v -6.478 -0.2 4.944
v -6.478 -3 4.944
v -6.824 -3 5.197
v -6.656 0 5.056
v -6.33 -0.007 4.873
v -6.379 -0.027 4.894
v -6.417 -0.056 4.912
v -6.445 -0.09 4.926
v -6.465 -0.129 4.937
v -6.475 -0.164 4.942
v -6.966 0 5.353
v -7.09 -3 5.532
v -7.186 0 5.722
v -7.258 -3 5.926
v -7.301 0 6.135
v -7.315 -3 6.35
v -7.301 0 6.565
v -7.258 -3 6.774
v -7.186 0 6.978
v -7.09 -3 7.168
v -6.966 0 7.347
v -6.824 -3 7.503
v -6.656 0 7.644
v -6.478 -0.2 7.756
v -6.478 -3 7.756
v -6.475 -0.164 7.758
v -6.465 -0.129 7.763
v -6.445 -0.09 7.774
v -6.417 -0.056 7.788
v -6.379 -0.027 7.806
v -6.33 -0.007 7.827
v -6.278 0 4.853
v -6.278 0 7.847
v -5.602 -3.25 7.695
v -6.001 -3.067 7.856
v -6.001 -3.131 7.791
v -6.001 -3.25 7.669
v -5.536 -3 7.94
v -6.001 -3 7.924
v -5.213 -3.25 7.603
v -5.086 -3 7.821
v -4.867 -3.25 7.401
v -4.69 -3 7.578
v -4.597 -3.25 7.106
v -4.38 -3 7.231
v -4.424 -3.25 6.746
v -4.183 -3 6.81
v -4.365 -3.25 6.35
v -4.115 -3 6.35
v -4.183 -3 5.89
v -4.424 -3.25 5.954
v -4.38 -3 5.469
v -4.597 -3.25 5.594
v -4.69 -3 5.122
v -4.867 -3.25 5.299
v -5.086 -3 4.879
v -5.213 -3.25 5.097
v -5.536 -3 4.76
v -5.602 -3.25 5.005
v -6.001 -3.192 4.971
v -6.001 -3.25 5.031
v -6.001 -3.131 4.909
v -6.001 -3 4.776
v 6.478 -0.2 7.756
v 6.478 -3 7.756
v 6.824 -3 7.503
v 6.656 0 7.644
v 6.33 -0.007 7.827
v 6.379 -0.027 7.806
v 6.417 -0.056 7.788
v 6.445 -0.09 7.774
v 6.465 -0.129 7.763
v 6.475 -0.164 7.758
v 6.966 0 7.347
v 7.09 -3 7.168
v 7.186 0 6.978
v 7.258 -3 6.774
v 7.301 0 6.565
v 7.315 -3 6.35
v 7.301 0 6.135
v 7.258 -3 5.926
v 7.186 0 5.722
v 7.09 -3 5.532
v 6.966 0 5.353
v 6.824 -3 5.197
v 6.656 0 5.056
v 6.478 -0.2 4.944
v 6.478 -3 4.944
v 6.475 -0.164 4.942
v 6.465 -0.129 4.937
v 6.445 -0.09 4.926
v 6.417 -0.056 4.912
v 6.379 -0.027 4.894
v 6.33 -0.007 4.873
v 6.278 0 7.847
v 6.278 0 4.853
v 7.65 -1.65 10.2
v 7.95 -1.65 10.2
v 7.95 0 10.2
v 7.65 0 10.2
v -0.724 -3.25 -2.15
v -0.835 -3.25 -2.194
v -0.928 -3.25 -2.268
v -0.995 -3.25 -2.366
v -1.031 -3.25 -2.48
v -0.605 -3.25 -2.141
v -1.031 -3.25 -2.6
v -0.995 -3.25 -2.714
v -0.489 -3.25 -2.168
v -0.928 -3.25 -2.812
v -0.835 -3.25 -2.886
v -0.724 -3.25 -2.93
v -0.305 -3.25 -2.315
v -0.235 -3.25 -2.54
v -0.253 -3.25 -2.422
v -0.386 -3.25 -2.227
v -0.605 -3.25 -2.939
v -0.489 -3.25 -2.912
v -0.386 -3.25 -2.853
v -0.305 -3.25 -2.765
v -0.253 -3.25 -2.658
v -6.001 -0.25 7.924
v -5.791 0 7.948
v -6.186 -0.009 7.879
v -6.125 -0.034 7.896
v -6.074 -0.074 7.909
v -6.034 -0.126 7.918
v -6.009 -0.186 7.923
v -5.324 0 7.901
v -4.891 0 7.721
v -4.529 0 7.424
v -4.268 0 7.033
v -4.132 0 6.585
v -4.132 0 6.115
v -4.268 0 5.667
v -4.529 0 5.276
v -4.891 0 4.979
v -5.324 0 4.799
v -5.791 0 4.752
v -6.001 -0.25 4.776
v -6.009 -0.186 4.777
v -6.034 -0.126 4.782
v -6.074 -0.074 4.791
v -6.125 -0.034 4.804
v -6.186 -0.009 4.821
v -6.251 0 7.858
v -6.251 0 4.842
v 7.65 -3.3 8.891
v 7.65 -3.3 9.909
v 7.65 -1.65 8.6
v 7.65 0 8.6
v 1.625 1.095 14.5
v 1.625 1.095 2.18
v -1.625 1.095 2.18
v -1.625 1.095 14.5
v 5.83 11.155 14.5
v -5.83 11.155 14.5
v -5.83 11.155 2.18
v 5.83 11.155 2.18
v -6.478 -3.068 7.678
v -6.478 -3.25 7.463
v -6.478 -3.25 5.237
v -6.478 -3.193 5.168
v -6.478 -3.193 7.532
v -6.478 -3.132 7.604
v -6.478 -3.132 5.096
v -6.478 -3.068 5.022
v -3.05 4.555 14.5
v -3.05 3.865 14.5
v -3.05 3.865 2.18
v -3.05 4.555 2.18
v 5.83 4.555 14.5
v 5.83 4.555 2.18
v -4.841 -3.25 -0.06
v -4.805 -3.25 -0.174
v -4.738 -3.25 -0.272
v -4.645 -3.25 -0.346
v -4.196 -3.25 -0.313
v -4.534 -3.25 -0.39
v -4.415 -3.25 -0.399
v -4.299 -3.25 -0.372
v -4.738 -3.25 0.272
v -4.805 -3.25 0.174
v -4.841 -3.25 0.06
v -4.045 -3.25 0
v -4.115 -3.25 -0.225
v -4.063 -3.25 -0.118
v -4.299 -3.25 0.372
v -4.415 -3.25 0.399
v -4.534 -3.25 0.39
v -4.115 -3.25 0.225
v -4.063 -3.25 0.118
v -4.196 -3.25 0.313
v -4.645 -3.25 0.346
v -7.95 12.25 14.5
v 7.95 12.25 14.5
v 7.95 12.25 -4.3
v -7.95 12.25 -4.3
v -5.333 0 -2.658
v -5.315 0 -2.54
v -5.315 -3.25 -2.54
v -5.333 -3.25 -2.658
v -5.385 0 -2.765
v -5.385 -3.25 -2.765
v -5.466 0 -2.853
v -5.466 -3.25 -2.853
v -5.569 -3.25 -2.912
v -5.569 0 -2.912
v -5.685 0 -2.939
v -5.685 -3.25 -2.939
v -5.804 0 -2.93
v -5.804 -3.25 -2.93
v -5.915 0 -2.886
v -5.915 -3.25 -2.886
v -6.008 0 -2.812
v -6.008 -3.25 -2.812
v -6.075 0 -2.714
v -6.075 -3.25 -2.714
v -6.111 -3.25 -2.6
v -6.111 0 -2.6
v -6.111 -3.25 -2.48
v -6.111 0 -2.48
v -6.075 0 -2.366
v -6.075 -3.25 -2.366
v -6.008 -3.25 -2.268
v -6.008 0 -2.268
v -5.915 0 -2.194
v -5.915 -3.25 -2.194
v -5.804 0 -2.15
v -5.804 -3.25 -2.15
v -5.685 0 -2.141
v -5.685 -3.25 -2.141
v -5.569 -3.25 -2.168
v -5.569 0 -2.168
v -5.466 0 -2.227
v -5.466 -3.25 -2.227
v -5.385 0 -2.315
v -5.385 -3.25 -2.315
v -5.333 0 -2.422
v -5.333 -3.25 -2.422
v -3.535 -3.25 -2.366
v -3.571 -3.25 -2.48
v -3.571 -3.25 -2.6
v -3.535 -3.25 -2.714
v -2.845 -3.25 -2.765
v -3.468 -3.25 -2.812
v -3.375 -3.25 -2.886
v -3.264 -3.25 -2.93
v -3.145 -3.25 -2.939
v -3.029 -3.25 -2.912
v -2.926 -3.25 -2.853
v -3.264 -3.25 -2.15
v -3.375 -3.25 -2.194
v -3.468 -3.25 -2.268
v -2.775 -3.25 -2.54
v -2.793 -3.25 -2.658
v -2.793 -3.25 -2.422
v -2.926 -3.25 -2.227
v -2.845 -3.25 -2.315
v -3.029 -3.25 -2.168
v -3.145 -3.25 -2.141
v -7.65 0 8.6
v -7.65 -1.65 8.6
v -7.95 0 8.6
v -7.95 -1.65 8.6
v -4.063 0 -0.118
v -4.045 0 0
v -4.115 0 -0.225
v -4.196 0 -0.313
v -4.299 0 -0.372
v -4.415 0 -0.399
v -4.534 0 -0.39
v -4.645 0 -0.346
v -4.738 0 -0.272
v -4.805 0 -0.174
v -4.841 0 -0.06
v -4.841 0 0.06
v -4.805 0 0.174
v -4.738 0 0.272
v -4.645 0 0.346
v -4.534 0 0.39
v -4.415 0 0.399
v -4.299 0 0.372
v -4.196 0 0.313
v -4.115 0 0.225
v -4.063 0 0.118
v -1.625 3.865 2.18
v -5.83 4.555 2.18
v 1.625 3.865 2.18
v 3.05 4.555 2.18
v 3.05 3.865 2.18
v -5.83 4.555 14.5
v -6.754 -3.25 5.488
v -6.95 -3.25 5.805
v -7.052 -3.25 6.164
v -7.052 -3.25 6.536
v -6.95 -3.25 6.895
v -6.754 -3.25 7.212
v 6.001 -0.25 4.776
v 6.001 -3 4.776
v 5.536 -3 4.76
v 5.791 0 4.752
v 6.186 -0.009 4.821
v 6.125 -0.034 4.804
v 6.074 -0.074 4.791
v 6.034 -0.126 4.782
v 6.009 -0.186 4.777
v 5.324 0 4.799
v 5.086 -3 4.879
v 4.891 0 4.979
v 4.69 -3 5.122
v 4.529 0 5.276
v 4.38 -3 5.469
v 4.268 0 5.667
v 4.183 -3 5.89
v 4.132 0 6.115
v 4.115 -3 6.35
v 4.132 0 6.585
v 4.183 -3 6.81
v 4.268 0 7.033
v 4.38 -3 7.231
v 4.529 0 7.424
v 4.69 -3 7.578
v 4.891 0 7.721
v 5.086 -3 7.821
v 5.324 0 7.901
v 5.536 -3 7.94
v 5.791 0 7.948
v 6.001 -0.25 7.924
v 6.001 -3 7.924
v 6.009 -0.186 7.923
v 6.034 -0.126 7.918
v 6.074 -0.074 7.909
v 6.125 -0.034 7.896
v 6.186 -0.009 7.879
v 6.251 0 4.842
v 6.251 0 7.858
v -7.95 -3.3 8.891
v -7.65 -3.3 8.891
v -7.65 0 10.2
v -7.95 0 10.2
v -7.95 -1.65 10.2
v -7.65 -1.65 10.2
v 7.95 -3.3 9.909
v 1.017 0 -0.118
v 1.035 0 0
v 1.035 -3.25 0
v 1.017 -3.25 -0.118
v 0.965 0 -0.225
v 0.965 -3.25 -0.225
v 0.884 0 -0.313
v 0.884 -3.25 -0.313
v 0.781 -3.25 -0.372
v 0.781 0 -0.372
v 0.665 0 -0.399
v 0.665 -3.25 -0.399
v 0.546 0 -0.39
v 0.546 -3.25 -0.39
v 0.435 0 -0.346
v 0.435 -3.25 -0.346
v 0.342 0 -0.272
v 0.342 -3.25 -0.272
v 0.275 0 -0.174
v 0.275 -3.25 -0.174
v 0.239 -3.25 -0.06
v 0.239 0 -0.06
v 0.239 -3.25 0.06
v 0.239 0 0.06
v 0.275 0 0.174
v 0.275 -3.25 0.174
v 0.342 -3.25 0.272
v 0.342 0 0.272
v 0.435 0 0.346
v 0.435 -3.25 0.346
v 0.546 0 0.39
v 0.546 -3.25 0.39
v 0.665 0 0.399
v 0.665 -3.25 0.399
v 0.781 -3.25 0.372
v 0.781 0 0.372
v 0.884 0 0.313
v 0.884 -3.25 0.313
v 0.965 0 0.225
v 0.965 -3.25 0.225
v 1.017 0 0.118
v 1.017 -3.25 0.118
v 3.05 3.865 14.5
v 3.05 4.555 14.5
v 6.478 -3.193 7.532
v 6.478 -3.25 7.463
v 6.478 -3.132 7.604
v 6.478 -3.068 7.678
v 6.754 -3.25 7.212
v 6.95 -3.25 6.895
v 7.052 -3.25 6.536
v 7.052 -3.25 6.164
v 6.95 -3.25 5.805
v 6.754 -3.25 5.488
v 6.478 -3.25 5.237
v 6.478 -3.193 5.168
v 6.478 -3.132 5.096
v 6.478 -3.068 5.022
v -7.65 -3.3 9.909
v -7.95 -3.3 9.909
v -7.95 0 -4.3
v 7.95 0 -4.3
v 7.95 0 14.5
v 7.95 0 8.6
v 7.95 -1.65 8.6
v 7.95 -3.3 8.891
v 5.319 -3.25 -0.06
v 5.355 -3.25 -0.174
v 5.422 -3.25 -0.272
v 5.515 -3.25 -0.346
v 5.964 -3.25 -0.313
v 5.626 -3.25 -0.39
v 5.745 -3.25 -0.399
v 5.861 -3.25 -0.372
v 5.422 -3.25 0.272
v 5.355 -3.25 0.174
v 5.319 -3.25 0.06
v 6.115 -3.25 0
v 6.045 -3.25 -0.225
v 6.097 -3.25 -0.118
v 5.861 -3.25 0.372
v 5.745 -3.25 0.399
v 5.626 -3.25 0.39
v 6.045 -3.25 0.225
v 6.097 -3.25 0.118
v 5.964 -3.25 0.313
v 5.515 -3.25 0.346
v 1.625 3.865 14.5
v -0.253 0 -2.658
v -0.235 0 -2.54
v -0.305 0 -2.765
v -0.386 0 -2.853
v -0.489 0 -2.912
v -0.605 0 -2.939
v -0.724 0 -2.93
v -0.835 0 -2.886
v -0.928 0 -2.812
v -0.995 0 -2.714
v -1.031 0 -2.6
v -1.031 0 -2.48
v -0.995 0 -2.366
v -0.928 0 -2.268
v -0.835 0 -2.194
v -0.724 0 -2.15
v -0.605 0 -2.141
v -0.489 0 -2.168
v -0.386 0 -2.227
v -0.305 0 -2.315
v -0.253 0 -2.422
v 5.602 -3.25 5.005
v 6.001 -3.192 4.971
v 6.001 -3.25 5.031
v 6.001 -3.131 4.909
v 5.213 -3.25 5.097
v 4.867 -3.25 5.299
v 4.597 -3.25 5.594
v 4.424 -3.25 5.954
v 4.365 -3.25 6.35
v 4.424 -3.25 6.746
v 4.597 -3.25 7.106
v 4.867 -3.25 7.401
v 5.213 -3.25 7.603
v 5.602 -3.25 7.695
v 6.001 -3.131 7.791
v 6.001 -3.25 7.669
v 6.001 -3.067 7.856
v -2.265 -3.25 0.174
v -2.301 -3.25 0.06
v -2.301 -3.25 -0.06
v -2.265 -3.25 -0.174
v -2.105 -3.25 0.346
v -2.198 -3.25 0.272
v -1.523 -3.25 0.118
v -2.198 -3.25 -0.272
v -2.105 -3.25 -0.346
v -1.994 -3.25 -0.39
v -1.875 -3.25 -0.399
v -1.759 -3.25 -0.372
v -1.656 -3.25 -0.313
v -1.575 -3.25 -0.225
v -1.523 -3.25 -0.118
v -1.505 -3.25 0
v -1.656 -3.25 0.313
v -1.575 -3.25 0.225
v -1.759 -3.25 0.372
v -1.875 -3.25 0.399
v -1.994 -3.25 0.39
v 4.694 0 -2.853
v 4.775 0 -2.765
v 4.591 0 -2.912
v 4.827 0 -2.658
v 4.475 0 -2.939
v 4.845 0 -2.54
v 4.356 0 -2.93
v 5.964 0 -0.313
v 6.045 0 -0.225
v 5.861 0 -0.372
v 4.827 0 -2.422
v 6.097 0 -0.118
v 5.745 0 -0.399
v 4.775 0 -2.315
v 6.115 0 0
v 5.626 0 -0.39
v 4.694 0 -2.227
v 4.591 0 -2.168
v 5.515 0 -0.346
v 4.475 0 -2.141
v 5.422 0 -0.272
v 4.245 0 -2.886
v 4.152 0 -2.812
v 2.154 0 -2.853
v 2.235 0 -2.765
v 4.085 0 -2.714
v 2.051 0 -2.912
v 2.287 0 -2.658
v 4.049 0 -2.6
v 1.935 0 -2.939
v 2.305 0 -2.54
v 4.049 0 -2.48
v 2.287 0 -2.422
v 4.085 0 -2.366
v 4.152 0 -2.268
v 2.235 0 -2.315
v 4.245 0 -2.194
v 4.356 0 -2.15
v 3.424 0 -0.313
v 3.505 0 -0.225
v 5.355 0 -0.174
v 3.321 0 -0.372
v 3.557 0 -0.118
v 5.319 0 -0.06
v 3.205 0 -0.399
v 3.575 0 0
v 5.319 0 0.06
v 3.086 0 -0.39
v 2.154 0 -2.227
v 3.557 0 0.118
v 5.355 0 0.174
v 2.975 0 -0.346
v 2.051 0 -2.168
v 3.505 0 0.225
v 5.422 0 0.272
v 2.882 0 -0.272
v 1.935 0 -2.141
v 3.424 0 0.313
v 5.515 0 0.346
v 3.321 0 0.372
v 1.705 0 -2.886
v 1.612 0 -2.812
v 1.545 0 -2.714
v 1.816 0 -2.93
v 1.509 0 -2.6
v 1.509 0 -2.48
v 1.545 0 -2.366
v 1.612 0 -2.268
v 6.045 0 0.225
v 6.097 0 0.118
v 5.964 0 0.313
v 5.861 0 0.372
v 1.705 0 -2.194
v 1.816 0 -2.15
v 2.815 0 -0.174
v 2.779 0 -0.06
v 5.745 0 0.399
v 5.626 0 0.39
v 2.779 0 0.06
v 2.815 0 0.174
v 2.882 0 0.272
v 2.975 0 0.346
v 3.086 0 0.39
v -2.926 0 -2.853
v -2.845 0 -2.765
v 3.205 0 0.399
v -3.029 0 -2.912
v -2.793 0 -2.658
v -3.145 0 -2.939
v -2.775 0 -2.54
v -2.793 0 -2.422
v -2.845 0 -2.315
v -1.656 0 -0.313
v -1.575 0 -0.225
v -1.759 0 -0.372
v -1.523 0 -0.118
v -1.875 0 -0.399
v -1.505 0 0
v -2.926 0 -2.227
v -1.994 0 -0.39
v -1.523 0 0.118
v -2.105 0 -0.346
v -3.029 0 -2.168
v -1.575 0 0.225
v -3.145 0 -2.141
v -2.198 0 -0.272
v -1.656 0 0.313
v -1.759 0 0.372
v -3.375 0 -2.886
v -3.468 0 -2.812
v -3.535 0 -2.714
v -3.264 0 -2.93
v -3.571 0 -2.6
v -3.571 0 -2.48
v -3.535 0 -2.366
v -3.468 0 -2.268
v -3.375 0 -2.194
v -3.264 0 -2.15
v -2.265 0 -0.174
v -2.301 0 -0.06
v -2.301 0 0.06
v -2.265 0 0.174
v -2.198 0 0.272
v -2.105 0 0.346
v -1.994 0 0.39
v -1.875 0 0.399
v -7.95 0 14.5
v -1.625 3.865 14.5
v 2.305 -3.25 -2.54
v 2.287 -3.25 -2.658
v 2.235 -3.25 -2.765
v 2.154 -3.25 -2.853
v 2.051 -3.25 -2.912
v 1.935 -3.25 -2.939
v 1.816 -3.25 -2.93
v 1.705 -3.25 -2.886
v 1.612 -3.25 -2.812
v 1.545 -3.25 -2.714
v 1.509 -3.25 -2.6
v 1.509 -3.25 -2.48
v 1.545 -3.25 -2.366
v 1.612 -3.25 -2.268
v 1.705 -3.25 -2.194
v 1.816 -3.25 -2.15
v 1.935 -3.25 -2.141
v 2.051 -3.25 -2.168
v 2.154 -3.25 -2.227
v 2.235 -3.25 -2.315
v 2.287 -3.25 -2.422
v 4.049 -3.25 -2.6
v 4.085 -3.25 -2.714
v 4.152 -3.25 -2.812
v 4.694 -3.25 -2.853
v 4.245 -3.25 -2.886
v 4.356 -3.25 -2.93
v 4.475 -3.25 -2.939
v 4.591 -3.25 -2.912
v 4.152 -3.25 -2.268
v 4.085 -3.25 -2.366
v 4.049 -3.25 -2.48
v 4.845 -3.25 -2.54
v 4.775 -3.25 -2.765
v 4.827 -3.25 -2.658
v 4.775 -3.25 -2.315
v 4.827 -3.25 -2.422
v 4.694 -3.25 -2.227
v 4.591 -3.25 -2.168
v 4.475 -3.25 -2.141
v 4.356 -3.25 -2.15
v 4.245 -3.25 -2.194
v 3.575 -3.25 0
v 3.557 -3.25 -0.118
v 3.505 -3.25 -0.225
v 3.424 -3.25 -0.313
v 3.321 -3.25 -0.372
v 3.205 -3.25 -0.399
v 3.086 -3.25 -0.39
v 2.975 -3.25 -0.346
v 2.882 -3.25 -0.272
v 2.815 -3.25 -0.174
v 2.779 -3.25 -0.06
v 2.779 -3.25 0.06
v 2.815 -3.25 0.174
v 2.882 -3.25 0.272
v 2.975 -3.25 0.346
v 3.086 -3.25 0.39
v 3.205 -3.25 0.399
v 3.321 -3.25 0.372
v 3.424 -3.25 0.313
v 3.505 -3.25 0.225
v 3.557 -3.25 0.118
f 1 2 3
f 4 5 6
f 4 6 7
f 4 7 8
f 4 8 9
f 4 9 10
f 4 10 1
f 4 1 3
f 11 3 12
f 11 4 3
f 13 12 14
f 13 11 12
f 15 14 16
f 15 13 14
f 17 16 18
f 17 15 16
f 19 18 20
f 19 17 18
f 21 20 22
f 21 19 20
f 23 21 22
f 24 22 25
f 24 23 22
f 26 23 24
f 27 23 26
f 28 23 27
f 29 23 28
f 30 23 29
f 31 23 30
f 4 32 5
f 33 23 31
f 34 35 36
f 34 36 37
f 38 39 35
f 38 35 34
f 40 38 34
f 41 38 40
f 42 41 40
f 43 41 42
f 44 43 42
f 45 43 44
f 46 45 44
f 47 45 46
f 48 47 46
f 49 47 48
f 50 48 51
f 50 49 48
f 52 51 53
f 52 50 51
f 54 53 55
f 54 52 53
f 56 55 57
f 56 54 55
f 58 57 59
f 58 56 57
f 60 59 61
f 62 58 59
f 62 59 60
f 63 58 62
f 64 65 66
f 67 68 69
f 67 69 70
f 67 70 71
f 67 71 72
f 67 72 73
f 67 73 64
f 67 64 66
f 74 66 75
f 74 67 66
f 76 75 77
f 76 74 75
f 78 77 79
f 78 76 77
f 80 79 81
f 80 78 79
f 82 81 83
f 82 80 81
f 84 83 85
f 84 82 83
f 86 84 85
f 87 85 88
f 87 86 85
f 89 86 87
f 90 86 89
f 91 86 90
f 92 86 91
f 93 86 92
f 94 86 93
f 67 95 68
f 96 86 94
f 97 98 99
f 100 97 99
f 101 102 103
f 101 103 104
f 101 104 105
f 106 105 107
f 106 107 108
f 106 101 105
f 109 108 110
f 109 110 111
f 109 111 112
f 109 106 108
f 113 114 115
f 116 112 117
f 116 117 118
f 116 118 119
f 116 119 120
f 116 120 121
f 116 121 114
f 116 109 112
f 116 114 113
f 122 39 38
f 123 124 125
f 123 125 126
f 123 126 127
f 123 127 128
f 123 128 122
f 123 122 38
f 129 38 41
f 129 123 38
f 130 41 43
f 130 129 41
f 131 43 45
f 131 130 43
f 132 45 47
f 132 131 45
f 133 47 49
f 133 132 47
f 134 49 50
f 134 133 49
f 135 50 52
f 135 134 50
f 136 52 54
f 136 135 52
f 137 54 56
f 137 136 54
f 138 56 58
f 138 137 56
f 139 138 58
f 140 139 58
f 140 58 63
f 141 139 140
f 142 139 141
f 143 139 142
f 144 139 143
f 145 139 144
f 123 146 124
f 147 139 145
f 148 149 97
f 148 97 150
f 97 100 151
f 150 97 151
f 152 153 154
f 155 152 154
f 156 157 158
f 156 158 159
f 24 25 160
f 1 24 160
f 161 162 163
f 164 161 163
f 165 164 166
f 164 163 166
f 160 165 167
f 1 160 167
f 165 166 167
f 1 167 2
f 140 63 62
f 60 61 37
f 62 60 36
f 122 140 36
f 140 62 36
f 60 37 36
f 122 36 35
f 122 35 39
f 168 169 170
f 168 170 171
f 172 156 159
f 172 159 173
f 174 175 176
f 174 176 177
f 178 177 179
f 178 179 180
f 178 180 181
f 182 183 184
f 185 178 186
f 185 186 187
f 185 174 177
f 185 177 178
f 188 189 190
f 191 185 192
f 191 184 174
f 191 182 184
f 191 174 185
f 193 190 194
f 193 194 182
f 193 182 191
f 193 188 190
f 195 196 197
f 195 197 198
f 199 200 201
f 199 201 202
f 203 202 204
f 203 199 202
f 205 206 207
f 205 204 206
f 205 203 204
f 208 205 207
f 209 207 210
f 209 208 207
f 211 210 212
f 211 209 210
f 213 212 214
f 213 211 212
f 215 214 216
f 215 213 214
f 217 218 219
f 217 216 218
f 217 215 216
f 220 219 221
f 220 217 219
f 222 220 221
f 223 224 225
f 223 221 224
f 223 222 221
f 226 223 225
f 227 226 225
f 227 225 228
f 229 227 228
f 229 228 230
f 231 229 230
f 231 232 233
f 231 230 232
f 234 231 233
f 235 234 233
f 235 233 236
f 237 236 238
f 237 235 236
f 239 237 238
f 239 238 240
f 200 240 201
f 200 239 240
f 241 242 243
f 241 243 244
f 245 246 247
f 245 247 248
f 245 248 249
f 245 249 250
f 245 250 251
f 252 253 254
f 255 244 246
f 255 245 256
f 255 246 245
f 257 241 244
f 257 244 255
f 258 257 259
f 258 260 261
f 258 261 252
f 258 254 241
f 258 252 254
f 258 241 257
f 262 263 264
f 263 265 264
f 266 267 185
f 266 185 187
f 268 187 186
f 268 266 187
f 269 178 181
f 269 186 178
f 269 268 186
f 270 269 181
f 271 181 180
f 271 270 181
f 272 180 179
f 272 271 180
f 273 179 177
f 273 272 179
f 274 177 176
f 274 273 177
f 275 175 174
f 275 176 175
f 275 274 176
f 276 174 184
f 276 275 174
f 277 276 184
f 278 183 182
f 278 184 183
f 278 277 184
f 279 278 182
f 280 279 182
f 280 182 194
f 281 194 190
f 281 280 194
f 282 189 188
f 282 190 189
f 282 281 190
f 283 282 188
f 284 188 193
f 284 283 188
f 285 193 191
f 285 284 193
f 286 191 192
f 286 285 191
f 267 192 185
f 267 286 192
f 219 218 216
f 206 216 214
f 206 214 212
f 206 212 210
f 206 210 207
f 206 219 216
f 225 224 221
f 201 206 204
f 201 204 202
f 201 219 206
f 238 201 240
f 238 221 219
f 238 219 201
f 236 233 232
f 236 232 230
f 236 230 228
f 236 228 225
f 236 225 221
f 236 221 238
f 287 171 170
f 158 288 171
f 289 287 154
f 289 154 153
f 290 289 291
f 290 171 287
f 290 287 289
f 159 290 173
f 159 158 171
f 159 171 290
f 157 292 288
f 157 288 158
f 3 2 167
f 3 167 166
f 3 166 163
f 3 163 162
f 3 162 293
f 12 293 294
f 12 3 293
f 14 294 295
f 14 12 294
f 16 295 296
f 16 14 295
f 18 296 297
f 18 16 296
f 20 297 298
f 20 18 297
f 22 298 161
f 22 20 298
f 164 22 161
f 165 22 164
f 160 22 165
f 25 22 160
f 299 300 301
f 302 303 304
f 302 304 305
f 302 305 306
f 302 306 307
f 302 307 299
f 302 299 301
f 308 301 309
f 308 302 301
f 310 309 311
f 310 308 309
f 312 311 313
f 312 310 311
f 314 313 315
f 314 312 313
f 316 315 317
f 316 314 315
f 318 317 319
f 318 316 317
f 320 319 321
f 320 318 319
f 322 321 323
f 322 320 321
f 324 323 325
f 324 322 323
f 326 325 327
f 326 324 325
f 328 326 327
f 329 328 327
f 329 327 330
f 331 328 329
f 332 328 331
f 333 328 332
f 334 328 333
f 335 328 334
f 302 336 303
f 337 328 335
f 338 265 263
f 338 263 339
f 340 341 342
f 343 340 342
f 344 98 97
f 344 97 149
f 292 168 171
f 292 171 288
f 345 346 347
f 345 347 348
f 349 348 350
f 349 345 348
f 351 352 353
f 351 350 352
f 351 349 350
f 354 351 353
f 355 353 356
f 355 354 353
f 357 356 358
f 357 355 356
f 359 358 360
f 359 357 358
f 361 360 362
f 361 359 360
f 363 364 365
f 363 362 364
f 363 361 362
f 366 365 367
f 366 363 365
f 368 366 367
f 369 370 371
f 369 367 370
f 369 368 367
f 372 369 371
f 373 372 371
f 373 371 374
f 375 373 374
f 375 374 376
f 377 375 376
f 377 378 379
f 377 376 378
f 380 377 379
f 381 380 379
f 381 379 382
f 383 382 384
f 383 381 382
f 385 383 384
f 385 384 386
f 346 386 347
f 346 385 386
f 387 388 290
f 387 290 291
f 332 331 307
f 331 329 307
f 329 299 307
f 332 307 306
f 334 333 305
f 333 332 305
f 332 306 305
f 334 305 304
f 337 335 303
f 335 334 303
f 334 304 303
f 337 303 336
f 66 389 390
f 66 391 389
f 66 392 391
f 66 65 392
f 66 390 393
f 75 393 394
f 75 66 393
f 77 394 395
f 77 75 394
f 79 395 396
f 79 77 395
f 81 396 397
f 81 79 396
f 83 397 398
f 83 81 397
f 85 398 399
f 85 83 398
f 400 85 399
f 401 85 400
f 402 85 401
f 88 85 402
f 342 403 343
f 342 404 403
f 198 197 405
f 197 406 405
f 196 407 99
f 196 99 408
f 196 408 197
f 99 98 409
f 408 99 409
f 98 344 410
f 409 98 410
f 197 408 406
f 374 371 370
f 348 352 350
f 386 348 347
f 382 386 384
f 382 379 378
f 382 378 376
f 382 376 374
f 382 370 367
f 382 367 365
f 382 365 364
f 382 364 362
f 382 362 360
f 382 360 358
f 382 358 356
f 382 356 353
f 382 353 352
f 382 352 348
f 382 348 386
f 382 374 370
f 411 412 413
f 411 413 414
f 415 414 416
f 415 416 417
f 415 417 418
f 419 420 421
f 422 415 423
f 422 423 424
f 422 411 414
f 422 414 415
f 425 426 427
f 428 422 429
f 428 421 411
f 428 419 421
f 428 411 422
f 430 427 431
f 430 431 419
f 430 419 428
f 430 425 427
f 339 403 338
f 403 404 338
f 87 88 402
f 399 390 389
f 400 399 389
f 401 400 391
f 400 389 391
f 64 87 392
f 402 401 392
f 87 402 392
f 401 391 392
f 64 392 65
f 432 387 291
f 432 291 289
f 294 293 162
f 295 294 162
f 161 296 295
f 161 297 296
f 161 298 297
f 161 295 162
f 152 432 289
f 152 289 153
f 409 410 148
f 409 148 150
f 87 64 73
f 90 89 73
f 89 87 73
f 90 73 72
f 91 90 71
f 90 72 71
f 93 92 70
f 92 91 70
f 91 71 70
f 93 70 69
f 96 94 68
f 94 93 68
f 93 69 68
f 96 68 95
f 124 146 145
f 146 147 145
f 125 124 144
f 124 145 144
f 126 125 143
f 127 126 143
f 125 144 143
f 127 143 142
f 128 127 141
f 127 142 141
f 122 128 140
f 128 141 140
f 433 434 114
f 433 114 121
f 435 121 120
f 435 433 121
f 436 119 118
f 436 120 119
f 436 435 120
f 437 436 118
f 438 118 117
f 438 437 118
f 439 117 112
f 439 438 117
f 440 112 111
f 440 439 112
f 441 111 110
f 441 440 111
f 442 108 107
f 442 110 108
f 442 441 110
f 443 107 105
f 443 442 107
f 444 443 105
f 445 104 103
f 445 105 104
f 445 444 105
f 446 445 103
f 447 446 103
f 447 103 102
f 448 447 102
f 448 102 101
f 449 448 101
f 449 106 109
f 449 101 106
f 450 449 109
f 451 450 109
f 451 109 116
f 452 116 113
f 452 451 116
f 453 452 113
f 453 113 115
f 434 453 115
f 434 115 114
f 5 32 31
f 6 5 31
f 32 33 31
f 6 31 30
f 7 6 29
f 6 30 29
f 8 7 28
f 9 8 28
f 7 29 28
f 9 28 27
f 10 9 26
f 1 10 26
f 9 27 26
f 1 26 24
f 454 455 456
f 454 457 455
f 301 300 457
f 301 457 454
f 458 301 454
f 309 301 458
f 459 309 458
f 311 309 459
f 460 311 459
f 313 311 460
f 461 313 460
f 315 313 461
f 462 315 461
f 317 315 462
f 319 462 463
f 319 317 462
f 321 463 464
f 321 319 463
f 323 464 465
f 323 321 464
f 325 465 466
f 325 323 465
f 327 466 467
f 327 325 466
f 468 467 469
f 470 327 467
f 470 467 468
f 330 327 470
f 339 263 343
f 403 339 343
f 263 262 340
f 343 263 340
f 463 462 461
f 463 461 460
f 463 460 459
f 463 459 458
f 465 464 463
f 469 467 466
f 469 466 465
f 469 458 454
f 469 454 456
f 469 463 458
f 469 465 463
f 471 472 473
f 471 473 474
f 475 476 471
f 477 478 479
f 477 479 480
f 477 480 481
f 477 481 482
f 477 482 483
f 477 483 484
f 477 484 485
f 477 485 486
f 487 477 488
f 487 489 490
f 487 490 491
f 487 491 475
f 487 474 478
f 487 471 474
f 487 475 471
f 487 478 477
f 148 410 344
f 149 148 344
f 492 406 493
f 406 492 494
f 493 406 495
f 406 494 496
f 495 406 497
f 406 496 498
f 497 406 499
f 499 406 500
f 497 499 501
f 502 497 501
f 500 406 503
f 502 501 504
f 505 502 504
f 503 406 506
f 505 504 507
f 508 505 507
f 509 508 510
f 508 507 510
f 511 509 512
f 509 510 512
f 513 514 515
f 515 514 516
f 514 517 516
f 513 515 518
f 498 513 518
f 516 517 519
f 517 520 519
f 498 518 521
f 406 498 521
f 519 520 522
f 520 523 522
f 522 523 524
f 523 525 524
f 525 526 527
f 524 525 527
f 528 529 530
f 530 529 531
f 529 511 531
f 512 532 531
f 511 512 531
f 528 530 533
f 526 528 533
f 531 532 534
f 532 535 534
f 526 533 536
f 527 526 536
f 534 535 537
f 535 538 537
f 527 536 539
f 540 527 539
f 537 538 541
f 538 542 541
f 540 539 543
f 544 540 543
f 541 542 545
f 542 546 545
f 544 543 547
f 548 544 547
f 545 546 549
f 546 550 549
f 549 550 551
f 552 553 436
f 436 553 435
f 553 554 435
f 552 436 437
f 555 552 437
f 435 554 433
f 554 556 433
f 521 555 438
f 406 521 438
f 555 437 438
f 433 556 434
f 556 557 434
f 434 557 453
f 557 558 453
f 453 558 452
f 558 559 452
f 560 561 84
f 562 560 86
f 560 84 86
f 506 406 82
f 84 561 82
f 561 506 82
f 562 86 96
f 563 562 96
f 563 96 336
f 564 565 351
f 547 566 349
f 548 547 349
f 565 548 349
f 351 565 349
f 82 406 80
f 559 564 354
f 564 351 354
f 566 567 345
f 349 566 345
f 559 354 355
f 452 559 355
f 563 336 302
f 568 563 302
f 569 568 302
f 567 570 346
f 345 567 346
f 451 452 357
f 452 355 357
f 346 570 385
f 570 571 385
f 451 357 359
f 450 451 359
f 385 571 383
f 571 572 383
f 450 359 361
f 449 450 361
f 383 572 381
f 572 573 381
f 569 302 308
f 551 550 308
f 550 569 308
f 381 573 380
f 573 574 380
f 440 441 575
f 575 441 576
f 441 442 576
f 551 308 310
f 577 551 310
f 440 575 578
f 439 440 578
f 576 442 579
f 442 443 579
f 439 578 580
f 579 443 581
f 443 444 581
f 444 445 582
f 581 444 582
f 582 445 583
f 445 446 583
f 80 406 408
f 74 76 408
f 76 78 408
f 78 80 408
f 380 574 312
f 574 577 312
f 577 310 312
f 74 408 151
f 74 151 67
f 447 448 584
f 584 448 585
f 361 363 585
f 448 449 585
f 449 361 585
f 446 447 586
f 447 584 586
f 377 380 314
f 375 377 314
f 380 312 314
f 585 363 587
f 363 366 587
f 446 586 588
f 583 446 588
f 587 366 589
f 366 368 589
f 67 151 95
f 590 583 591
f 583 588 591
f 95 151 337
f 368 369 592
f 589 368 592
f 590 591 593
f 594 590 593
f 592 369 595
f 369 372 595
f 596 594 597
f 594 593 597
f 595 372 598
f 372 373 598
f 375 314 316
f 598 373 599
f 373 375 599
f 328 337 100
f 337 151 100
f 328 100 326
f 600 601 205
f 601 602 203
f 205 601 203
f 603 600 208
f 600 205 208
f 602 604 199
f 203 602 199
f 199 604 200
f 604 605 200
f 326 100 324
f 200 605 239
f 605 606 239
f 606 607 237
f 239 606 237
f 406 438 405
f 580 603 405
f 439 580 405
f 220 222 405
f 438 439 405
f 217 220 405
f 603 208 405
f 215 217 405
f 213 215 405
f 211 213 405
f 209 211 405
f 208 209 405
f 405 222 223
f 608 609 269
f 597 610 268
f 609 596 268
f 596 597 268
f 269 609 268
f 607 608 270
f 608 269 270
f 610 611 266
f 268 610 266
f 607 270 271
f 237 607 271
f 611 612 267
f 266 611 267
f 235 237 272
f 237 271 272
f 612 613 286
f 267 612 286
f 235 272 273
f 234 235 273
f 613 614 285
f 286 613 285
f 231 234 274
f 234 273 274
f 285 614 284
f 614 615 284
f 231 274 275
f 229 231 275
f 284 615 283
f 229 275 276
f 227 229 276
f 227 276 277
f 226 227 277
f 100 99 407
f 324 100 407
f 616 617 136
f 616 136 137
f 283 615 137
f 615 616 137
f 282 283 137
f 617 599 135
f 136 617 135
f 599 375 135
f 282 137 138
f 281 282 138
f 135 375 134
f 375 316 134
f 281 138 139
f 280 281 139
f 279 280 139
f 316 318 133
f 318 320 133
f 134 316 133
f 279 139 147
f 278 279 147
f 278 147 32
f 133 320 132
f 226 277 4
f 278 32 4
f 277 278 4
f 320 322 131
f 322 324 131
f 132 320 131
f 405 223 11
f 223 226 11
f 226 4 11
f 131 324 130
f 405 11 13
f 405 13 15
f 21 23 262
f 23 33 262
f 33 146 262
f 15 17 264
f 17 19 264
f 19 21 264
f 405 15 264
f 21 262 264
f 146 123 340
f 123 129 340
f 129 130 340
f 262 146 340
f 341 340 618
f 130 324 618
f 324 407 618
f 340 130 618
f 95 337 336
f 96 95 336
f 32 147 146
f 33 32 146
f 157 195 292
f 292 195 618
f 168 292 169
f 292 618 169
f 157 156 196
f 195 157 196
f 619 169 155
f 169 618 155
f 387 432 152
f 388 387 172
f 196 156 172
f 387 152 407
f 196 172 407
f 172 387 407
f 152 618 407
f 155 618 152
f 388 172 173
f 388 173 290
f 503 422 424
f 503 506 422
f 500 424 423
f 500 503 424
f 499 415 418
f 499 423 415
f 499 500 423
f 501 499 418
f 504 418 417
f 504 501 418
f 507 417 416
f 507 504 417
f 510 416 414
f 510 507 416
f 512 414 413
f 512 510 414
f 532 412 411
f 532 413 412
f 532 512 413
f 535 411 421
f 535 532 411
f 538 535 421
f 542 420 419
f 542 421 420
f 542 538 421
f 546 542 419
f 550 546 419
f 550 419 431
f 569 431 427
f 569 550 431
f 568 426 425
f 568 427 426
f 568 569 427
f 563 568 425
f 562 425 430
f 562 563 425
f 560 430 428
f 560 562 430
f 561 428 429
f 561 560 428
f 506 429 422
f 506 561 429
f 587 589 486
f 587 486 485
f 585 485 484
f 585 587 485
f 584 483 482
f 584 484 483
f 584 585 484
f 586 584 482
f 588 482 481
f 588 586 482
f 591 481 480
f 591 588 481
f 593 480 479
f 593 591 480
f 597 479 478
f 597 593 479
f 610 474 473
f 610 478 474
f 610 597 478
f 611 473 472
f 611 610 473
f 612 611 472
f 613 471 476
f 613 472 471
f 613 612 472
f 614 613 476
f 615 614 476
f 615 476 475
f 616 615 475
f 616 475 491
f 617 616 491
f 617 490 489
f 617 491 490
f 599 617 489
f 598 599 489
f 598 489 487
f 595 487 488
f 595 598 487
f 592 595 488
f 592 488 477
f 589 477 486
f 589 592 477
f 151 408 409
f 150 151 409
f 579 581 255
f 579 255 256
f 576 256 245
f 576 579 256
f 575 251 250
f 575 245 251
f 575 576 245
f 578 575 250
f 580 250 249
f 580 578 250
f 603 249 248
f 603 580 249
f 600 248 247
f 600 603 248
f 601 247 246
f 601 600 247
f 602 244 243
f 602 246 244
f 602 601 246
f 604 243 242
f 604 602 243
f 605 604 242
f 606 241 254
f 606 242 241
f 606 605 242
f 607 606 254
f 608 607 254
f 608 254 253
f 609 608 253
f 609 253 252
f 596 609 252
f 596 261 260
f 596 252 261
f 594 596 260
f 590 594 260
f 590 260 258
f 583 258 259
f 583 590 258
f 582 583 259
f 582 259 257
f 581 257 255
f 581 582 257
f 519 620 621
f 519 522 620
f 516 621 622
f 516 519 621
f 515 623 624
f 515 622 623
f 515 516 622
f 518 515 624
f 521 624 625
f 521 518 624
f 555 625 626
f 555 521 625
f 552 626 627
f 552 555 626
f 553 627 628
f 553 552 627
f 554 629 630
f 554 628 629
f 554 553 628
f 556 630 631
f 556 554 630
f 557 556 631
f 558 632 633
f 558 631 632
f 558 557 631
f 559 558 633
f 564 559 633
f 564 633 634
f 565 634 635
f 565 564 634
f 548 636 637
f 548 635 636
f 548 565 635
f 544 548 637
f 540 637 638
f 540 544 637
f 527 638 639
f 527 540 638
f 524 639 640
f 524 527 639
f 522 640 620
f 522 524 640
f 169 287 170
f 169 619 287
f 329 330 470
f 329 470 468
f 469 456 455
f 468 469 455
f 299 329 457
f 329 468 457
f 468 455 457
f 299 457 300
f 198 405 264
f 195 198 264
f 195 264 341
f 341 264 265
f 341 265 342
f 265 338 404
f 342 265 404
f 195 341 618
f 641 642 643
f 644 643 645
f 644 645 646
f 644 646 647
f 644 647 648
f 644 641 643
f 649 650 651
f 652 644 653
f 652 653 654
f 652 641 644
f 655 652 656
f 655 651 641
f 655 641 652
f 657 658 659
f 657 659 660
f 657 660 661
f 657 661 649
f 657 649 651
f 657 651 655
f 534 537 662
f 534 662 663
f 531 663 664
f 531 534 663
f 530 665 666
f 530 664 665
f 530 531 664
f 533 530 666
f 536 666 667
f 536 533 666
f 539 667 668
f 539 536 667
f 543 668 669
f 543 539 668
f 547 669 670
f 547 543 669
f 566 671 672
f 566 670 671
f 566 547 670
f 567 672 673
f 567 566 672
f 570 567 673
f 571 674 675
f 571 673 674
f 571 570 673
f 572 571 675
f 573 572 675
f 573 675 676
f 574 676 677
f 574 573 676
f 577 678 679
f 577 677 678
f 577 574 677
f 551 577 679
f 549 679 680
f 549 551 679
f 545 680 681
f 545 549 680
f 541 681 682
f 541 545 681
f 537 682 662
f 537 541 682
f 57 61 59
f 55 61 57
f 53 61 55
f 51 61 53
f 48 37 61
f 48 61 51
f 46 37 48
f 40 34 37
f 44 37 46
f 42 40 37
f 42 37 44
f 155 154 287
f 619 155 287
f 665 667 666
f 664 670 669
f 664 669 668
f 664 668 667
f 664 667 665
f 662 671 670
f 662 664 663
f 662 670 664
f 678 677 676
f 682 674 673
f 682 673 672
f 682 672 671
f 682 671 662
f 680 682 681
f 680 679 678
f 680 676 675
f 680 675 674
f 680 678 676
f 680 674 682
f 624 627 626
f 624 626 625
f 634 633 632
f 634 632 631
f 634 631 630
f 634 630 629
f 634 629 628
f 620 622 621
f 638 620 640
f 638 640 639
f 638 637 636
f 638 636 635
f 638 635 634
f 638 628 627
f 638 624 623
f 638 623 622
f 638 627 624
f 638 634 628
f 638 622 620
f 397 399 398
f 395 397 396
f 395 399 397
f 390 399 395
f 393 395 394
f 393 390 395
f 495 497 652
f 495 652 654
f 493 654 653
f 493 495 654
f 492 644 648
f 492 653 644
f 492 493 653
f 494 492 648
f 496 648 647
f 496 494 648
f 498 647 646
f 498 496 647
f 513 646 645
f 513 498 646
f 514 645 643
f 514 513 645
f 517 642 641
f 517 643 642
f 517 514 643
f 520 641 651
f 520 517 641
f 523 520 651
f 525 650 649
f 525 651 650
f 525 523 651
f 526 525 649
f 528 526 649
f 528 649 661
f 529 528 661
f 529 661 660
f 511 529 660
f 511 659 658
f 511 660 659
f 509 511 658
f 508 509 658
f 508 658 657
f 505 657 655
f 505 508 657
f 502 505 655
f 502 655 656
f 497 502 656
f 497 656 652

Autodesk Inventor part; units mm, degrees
ref_plane "YZ Plane" through (0, 0, 0) normal (1, 0, 0) x (0, 1, 0)
ref_plane "XZ Plane" through (0, 0, 0) normal (0, 1, 0) x (-1, 0, 0)
ref_plane "XY Plane" through (0, 0, 0) normal (0, 0, 1) x (1, 0, 0)
sketch "Sketch1" plane through (0, 0, 0) normal (0, 1, 0) x (-1, 0, 0)
  line L0 (7.95, 14.5) -> (-7.95, 14.5)
  line L1 (-7.95, 14.5) -> (-7.95, -4.3)
  line L2 (-7.95, -4.3) -> (7.95, -4.3)
  line L3 (7.95, -4.3) -> (7.95, 14.5)
  point P0 (0, 0)
  dimension "d0" = 18.8
  dimension "d1" = 15.9
  dimension "d2" = 7.95
  dimension "d5" = 14.5
extrude "Extrusion1" add sketch "Sketch1" along normal blind 12.25
sketch "Sketch2" plane through (-7.95, 0, 14.5) normal (0, 0, 1) x (1, 0, 0)
  line L0 (2.12, 11.155) -> (13.78, 11.155)
  line L1 (13.78, 11.155) -> (13.78, 4.555)
  line L2 (13.78, 4.555) -> (2.12, 4.555)
  line L3 (2.12, 4.555) -> (2.12, 11.155)
  line L4 (4.9, 4.555) -> (11, 4.555)
  line L5 (11, 4.555) -> (11, 3.865)
  line L6 (11, 3.865) -> (4.9, 3.865)
  line L7 (4.9, 3.865) -> (4.9, 4.555)
  line L8 (6.325, 3.865) -> (9.575, 3.865)
  line L9 (9.575, 3.865) -> (9.575, 1.095)
  line L10 (9.575, 1.095) -> (6.325, 1.095)
  line L11 (6.325, 1.095) -> (6.325, 3.865)
  line L12 (0, 12.25) -> (15.9, 12.25) projected
  point P0 (7.95, 0)
  dimension "d6" = 11.66
  dimension "d7" = 5.83
  dimension "d8" = 6.1
  dimension "d9" = 3.05
  dimension "d10" = 3.25
  dimension "d11" = 1.625
  dimension "d12" = 7.29
  dimension "d13" = 2.77
  dimension "d14" = 6.6
  dimension "d16" = 1.095
extrude "Extrusion2" cut sketch "Sketch2" against normal blind 12.32
sketch "Sketch3" plane through (7.95, 0, 14.5) normal (1, 0, 0) x (0, 0, -1)
  line L0 (4.3, 0) -> (5.9, 0)
  line L1 (5.9, 0) -> (5.9, -3.3)
  line L2 (5.9, -3.3) -> (4.3, -3.3)
  line L3 (4.3, -3.3) -> (4.3, 0)
  line L4 (0, 0) -> (0, 12.25) projected
  line L5 (4.3, -1.65) -> (4.5909, -3.3)
  line L6 (5.6091, -3.3) -> (5.9, -1.65)
  line L7 (0, 0) -> (18.8, 0) projected
  point P0 (14.5, 0)
  dimension "d19" = 3.3
  dimension "d20" = 1.6
  dimension "d21" = 4.3
  dimension "d22" = 10
  dimension "d23" = 10
  dimension "d24" = 1.65
  dimension "d25" = 0
extrude "Extrusion3" add sketch "Sketch3" against normal blind 0.3 contours L0 L1 L6 L2 L5 L3
mirror "Mirror1" about plane through (0, 0, 0) normal (1, 0, 0) of "Extrusion3"
sketch "Sketch4" plane through (0, 0, 0) normal (0, -1, 0) x (1, 0, 0)
  circle A0 centre (5.715, 6.35) radius 1.6
  line L0 (-7.95, 14.5) -> (7.95, 14.5) projected
  point P0 (0, 0)
  dimension "d28" = 3.2
  dimension "d29" = 8.15
  dimension "d30" = 5.715
extrude "Extrusion4" add sketch "Sketch4" along normal blind 3.25
chamfer "Chamfer1" distance 0.25 angle 45 1 edges at (4.115, -3.25, 6.35)
sketch "Sketch5" plane through (5.715, -3.25, 6.35) normal (0, -1, 0) x (1, 0, 0)
  line L0 (0.7635, 1.8366) -> (0.2859, 1.8366)
  line L1 (0.2859, 1.8366) -> (0.2859, -1.8337)
  line L2 (0.2859, -1.8337) -> (0.7635, -1.8337)
  line L3 (0.7635, -1.8337) -> (0.7635, 1.8366)
  point P0 (-5.715, -6.35)
extrude "Extrusion5" cut sketch "Sketch5" against normal blind 3.25
fillet "Fillet1" radius 0.25 1 edges at (6.0009, 0, 6.35)
fillet "Fillet2" radius 0.2 1 edges at (6.4785, 0, 6.35)
mirror "Mirror2" about plane through (0, 0, 0) normal (1, 0, 0) of "Extrusion4", "Chamfer1", "Extrusion5", "Fillet1", "Fillet2"
sketch "Sketch6" plane through (0, 0, 0) normal (0, -1, 0) x (1, 0, 0)
  line L0 (3.8973, 0) -> (-6.9227, 0) construction
  line L1 (4.2984, -2.54) -> (-6.5216, -2.54) construction
  circle A0 centre (0.635, 0) radius 0.4
  circle A1 centre (-0.635, -2.54) radius 0.4
  circle A2 centre (-3.175, -2.54) radius 0.4
  circle A3 centre (-5.715, -2.54) radius 0.4
  circle A4 centre (1.905, -2.54) radius 0.4
  circle A5 centre (-0.635, -2.54) radius 0.4
  circle A6 centre (-3.175, -2.54) radius 0.4
  circle A7 centre (4.445, -2.54) radius 0.4
  circle A8 centre (1.905, -2.54) radius 0.4
  circle A9 centre (-0.635, -2.54) radius 0.4
  circle A10 centre (-1.905, 0) radius 0.4
  circle A11 centre (-4.445, 0) radius 0.4
  circle A12 centre (3.175, 0) radius 0.4
  circle A13 centre (0.635, 0) radius 0.4
  circle A14 centre (-1.905, 0) radius 0.4
  circle A15 centre (5.715, 0) radius 0.4
  circle A16 centre (3.175, 0) radius 0.4
  circle A17 centre (0.635, 0) radius 0.4
  point P0 (0, 0)
  dimension "d40" = 2.54
  dimension "d41" = 0
  dimension "d45" = 0.8
  dimension "d46" = 0.8
  dimension "d49" = 2.54
  dimension "d52" = 2.54
  dimension "d57" = 2.54
  dimension "d60" = 2.54
  dimension "d63" = 0.635
  dimension "d64" = 0.635
extrude "Extrusion6" add sketch "Sketch6" along normal blind 3.25
properties part number "RJE051AA1310"
